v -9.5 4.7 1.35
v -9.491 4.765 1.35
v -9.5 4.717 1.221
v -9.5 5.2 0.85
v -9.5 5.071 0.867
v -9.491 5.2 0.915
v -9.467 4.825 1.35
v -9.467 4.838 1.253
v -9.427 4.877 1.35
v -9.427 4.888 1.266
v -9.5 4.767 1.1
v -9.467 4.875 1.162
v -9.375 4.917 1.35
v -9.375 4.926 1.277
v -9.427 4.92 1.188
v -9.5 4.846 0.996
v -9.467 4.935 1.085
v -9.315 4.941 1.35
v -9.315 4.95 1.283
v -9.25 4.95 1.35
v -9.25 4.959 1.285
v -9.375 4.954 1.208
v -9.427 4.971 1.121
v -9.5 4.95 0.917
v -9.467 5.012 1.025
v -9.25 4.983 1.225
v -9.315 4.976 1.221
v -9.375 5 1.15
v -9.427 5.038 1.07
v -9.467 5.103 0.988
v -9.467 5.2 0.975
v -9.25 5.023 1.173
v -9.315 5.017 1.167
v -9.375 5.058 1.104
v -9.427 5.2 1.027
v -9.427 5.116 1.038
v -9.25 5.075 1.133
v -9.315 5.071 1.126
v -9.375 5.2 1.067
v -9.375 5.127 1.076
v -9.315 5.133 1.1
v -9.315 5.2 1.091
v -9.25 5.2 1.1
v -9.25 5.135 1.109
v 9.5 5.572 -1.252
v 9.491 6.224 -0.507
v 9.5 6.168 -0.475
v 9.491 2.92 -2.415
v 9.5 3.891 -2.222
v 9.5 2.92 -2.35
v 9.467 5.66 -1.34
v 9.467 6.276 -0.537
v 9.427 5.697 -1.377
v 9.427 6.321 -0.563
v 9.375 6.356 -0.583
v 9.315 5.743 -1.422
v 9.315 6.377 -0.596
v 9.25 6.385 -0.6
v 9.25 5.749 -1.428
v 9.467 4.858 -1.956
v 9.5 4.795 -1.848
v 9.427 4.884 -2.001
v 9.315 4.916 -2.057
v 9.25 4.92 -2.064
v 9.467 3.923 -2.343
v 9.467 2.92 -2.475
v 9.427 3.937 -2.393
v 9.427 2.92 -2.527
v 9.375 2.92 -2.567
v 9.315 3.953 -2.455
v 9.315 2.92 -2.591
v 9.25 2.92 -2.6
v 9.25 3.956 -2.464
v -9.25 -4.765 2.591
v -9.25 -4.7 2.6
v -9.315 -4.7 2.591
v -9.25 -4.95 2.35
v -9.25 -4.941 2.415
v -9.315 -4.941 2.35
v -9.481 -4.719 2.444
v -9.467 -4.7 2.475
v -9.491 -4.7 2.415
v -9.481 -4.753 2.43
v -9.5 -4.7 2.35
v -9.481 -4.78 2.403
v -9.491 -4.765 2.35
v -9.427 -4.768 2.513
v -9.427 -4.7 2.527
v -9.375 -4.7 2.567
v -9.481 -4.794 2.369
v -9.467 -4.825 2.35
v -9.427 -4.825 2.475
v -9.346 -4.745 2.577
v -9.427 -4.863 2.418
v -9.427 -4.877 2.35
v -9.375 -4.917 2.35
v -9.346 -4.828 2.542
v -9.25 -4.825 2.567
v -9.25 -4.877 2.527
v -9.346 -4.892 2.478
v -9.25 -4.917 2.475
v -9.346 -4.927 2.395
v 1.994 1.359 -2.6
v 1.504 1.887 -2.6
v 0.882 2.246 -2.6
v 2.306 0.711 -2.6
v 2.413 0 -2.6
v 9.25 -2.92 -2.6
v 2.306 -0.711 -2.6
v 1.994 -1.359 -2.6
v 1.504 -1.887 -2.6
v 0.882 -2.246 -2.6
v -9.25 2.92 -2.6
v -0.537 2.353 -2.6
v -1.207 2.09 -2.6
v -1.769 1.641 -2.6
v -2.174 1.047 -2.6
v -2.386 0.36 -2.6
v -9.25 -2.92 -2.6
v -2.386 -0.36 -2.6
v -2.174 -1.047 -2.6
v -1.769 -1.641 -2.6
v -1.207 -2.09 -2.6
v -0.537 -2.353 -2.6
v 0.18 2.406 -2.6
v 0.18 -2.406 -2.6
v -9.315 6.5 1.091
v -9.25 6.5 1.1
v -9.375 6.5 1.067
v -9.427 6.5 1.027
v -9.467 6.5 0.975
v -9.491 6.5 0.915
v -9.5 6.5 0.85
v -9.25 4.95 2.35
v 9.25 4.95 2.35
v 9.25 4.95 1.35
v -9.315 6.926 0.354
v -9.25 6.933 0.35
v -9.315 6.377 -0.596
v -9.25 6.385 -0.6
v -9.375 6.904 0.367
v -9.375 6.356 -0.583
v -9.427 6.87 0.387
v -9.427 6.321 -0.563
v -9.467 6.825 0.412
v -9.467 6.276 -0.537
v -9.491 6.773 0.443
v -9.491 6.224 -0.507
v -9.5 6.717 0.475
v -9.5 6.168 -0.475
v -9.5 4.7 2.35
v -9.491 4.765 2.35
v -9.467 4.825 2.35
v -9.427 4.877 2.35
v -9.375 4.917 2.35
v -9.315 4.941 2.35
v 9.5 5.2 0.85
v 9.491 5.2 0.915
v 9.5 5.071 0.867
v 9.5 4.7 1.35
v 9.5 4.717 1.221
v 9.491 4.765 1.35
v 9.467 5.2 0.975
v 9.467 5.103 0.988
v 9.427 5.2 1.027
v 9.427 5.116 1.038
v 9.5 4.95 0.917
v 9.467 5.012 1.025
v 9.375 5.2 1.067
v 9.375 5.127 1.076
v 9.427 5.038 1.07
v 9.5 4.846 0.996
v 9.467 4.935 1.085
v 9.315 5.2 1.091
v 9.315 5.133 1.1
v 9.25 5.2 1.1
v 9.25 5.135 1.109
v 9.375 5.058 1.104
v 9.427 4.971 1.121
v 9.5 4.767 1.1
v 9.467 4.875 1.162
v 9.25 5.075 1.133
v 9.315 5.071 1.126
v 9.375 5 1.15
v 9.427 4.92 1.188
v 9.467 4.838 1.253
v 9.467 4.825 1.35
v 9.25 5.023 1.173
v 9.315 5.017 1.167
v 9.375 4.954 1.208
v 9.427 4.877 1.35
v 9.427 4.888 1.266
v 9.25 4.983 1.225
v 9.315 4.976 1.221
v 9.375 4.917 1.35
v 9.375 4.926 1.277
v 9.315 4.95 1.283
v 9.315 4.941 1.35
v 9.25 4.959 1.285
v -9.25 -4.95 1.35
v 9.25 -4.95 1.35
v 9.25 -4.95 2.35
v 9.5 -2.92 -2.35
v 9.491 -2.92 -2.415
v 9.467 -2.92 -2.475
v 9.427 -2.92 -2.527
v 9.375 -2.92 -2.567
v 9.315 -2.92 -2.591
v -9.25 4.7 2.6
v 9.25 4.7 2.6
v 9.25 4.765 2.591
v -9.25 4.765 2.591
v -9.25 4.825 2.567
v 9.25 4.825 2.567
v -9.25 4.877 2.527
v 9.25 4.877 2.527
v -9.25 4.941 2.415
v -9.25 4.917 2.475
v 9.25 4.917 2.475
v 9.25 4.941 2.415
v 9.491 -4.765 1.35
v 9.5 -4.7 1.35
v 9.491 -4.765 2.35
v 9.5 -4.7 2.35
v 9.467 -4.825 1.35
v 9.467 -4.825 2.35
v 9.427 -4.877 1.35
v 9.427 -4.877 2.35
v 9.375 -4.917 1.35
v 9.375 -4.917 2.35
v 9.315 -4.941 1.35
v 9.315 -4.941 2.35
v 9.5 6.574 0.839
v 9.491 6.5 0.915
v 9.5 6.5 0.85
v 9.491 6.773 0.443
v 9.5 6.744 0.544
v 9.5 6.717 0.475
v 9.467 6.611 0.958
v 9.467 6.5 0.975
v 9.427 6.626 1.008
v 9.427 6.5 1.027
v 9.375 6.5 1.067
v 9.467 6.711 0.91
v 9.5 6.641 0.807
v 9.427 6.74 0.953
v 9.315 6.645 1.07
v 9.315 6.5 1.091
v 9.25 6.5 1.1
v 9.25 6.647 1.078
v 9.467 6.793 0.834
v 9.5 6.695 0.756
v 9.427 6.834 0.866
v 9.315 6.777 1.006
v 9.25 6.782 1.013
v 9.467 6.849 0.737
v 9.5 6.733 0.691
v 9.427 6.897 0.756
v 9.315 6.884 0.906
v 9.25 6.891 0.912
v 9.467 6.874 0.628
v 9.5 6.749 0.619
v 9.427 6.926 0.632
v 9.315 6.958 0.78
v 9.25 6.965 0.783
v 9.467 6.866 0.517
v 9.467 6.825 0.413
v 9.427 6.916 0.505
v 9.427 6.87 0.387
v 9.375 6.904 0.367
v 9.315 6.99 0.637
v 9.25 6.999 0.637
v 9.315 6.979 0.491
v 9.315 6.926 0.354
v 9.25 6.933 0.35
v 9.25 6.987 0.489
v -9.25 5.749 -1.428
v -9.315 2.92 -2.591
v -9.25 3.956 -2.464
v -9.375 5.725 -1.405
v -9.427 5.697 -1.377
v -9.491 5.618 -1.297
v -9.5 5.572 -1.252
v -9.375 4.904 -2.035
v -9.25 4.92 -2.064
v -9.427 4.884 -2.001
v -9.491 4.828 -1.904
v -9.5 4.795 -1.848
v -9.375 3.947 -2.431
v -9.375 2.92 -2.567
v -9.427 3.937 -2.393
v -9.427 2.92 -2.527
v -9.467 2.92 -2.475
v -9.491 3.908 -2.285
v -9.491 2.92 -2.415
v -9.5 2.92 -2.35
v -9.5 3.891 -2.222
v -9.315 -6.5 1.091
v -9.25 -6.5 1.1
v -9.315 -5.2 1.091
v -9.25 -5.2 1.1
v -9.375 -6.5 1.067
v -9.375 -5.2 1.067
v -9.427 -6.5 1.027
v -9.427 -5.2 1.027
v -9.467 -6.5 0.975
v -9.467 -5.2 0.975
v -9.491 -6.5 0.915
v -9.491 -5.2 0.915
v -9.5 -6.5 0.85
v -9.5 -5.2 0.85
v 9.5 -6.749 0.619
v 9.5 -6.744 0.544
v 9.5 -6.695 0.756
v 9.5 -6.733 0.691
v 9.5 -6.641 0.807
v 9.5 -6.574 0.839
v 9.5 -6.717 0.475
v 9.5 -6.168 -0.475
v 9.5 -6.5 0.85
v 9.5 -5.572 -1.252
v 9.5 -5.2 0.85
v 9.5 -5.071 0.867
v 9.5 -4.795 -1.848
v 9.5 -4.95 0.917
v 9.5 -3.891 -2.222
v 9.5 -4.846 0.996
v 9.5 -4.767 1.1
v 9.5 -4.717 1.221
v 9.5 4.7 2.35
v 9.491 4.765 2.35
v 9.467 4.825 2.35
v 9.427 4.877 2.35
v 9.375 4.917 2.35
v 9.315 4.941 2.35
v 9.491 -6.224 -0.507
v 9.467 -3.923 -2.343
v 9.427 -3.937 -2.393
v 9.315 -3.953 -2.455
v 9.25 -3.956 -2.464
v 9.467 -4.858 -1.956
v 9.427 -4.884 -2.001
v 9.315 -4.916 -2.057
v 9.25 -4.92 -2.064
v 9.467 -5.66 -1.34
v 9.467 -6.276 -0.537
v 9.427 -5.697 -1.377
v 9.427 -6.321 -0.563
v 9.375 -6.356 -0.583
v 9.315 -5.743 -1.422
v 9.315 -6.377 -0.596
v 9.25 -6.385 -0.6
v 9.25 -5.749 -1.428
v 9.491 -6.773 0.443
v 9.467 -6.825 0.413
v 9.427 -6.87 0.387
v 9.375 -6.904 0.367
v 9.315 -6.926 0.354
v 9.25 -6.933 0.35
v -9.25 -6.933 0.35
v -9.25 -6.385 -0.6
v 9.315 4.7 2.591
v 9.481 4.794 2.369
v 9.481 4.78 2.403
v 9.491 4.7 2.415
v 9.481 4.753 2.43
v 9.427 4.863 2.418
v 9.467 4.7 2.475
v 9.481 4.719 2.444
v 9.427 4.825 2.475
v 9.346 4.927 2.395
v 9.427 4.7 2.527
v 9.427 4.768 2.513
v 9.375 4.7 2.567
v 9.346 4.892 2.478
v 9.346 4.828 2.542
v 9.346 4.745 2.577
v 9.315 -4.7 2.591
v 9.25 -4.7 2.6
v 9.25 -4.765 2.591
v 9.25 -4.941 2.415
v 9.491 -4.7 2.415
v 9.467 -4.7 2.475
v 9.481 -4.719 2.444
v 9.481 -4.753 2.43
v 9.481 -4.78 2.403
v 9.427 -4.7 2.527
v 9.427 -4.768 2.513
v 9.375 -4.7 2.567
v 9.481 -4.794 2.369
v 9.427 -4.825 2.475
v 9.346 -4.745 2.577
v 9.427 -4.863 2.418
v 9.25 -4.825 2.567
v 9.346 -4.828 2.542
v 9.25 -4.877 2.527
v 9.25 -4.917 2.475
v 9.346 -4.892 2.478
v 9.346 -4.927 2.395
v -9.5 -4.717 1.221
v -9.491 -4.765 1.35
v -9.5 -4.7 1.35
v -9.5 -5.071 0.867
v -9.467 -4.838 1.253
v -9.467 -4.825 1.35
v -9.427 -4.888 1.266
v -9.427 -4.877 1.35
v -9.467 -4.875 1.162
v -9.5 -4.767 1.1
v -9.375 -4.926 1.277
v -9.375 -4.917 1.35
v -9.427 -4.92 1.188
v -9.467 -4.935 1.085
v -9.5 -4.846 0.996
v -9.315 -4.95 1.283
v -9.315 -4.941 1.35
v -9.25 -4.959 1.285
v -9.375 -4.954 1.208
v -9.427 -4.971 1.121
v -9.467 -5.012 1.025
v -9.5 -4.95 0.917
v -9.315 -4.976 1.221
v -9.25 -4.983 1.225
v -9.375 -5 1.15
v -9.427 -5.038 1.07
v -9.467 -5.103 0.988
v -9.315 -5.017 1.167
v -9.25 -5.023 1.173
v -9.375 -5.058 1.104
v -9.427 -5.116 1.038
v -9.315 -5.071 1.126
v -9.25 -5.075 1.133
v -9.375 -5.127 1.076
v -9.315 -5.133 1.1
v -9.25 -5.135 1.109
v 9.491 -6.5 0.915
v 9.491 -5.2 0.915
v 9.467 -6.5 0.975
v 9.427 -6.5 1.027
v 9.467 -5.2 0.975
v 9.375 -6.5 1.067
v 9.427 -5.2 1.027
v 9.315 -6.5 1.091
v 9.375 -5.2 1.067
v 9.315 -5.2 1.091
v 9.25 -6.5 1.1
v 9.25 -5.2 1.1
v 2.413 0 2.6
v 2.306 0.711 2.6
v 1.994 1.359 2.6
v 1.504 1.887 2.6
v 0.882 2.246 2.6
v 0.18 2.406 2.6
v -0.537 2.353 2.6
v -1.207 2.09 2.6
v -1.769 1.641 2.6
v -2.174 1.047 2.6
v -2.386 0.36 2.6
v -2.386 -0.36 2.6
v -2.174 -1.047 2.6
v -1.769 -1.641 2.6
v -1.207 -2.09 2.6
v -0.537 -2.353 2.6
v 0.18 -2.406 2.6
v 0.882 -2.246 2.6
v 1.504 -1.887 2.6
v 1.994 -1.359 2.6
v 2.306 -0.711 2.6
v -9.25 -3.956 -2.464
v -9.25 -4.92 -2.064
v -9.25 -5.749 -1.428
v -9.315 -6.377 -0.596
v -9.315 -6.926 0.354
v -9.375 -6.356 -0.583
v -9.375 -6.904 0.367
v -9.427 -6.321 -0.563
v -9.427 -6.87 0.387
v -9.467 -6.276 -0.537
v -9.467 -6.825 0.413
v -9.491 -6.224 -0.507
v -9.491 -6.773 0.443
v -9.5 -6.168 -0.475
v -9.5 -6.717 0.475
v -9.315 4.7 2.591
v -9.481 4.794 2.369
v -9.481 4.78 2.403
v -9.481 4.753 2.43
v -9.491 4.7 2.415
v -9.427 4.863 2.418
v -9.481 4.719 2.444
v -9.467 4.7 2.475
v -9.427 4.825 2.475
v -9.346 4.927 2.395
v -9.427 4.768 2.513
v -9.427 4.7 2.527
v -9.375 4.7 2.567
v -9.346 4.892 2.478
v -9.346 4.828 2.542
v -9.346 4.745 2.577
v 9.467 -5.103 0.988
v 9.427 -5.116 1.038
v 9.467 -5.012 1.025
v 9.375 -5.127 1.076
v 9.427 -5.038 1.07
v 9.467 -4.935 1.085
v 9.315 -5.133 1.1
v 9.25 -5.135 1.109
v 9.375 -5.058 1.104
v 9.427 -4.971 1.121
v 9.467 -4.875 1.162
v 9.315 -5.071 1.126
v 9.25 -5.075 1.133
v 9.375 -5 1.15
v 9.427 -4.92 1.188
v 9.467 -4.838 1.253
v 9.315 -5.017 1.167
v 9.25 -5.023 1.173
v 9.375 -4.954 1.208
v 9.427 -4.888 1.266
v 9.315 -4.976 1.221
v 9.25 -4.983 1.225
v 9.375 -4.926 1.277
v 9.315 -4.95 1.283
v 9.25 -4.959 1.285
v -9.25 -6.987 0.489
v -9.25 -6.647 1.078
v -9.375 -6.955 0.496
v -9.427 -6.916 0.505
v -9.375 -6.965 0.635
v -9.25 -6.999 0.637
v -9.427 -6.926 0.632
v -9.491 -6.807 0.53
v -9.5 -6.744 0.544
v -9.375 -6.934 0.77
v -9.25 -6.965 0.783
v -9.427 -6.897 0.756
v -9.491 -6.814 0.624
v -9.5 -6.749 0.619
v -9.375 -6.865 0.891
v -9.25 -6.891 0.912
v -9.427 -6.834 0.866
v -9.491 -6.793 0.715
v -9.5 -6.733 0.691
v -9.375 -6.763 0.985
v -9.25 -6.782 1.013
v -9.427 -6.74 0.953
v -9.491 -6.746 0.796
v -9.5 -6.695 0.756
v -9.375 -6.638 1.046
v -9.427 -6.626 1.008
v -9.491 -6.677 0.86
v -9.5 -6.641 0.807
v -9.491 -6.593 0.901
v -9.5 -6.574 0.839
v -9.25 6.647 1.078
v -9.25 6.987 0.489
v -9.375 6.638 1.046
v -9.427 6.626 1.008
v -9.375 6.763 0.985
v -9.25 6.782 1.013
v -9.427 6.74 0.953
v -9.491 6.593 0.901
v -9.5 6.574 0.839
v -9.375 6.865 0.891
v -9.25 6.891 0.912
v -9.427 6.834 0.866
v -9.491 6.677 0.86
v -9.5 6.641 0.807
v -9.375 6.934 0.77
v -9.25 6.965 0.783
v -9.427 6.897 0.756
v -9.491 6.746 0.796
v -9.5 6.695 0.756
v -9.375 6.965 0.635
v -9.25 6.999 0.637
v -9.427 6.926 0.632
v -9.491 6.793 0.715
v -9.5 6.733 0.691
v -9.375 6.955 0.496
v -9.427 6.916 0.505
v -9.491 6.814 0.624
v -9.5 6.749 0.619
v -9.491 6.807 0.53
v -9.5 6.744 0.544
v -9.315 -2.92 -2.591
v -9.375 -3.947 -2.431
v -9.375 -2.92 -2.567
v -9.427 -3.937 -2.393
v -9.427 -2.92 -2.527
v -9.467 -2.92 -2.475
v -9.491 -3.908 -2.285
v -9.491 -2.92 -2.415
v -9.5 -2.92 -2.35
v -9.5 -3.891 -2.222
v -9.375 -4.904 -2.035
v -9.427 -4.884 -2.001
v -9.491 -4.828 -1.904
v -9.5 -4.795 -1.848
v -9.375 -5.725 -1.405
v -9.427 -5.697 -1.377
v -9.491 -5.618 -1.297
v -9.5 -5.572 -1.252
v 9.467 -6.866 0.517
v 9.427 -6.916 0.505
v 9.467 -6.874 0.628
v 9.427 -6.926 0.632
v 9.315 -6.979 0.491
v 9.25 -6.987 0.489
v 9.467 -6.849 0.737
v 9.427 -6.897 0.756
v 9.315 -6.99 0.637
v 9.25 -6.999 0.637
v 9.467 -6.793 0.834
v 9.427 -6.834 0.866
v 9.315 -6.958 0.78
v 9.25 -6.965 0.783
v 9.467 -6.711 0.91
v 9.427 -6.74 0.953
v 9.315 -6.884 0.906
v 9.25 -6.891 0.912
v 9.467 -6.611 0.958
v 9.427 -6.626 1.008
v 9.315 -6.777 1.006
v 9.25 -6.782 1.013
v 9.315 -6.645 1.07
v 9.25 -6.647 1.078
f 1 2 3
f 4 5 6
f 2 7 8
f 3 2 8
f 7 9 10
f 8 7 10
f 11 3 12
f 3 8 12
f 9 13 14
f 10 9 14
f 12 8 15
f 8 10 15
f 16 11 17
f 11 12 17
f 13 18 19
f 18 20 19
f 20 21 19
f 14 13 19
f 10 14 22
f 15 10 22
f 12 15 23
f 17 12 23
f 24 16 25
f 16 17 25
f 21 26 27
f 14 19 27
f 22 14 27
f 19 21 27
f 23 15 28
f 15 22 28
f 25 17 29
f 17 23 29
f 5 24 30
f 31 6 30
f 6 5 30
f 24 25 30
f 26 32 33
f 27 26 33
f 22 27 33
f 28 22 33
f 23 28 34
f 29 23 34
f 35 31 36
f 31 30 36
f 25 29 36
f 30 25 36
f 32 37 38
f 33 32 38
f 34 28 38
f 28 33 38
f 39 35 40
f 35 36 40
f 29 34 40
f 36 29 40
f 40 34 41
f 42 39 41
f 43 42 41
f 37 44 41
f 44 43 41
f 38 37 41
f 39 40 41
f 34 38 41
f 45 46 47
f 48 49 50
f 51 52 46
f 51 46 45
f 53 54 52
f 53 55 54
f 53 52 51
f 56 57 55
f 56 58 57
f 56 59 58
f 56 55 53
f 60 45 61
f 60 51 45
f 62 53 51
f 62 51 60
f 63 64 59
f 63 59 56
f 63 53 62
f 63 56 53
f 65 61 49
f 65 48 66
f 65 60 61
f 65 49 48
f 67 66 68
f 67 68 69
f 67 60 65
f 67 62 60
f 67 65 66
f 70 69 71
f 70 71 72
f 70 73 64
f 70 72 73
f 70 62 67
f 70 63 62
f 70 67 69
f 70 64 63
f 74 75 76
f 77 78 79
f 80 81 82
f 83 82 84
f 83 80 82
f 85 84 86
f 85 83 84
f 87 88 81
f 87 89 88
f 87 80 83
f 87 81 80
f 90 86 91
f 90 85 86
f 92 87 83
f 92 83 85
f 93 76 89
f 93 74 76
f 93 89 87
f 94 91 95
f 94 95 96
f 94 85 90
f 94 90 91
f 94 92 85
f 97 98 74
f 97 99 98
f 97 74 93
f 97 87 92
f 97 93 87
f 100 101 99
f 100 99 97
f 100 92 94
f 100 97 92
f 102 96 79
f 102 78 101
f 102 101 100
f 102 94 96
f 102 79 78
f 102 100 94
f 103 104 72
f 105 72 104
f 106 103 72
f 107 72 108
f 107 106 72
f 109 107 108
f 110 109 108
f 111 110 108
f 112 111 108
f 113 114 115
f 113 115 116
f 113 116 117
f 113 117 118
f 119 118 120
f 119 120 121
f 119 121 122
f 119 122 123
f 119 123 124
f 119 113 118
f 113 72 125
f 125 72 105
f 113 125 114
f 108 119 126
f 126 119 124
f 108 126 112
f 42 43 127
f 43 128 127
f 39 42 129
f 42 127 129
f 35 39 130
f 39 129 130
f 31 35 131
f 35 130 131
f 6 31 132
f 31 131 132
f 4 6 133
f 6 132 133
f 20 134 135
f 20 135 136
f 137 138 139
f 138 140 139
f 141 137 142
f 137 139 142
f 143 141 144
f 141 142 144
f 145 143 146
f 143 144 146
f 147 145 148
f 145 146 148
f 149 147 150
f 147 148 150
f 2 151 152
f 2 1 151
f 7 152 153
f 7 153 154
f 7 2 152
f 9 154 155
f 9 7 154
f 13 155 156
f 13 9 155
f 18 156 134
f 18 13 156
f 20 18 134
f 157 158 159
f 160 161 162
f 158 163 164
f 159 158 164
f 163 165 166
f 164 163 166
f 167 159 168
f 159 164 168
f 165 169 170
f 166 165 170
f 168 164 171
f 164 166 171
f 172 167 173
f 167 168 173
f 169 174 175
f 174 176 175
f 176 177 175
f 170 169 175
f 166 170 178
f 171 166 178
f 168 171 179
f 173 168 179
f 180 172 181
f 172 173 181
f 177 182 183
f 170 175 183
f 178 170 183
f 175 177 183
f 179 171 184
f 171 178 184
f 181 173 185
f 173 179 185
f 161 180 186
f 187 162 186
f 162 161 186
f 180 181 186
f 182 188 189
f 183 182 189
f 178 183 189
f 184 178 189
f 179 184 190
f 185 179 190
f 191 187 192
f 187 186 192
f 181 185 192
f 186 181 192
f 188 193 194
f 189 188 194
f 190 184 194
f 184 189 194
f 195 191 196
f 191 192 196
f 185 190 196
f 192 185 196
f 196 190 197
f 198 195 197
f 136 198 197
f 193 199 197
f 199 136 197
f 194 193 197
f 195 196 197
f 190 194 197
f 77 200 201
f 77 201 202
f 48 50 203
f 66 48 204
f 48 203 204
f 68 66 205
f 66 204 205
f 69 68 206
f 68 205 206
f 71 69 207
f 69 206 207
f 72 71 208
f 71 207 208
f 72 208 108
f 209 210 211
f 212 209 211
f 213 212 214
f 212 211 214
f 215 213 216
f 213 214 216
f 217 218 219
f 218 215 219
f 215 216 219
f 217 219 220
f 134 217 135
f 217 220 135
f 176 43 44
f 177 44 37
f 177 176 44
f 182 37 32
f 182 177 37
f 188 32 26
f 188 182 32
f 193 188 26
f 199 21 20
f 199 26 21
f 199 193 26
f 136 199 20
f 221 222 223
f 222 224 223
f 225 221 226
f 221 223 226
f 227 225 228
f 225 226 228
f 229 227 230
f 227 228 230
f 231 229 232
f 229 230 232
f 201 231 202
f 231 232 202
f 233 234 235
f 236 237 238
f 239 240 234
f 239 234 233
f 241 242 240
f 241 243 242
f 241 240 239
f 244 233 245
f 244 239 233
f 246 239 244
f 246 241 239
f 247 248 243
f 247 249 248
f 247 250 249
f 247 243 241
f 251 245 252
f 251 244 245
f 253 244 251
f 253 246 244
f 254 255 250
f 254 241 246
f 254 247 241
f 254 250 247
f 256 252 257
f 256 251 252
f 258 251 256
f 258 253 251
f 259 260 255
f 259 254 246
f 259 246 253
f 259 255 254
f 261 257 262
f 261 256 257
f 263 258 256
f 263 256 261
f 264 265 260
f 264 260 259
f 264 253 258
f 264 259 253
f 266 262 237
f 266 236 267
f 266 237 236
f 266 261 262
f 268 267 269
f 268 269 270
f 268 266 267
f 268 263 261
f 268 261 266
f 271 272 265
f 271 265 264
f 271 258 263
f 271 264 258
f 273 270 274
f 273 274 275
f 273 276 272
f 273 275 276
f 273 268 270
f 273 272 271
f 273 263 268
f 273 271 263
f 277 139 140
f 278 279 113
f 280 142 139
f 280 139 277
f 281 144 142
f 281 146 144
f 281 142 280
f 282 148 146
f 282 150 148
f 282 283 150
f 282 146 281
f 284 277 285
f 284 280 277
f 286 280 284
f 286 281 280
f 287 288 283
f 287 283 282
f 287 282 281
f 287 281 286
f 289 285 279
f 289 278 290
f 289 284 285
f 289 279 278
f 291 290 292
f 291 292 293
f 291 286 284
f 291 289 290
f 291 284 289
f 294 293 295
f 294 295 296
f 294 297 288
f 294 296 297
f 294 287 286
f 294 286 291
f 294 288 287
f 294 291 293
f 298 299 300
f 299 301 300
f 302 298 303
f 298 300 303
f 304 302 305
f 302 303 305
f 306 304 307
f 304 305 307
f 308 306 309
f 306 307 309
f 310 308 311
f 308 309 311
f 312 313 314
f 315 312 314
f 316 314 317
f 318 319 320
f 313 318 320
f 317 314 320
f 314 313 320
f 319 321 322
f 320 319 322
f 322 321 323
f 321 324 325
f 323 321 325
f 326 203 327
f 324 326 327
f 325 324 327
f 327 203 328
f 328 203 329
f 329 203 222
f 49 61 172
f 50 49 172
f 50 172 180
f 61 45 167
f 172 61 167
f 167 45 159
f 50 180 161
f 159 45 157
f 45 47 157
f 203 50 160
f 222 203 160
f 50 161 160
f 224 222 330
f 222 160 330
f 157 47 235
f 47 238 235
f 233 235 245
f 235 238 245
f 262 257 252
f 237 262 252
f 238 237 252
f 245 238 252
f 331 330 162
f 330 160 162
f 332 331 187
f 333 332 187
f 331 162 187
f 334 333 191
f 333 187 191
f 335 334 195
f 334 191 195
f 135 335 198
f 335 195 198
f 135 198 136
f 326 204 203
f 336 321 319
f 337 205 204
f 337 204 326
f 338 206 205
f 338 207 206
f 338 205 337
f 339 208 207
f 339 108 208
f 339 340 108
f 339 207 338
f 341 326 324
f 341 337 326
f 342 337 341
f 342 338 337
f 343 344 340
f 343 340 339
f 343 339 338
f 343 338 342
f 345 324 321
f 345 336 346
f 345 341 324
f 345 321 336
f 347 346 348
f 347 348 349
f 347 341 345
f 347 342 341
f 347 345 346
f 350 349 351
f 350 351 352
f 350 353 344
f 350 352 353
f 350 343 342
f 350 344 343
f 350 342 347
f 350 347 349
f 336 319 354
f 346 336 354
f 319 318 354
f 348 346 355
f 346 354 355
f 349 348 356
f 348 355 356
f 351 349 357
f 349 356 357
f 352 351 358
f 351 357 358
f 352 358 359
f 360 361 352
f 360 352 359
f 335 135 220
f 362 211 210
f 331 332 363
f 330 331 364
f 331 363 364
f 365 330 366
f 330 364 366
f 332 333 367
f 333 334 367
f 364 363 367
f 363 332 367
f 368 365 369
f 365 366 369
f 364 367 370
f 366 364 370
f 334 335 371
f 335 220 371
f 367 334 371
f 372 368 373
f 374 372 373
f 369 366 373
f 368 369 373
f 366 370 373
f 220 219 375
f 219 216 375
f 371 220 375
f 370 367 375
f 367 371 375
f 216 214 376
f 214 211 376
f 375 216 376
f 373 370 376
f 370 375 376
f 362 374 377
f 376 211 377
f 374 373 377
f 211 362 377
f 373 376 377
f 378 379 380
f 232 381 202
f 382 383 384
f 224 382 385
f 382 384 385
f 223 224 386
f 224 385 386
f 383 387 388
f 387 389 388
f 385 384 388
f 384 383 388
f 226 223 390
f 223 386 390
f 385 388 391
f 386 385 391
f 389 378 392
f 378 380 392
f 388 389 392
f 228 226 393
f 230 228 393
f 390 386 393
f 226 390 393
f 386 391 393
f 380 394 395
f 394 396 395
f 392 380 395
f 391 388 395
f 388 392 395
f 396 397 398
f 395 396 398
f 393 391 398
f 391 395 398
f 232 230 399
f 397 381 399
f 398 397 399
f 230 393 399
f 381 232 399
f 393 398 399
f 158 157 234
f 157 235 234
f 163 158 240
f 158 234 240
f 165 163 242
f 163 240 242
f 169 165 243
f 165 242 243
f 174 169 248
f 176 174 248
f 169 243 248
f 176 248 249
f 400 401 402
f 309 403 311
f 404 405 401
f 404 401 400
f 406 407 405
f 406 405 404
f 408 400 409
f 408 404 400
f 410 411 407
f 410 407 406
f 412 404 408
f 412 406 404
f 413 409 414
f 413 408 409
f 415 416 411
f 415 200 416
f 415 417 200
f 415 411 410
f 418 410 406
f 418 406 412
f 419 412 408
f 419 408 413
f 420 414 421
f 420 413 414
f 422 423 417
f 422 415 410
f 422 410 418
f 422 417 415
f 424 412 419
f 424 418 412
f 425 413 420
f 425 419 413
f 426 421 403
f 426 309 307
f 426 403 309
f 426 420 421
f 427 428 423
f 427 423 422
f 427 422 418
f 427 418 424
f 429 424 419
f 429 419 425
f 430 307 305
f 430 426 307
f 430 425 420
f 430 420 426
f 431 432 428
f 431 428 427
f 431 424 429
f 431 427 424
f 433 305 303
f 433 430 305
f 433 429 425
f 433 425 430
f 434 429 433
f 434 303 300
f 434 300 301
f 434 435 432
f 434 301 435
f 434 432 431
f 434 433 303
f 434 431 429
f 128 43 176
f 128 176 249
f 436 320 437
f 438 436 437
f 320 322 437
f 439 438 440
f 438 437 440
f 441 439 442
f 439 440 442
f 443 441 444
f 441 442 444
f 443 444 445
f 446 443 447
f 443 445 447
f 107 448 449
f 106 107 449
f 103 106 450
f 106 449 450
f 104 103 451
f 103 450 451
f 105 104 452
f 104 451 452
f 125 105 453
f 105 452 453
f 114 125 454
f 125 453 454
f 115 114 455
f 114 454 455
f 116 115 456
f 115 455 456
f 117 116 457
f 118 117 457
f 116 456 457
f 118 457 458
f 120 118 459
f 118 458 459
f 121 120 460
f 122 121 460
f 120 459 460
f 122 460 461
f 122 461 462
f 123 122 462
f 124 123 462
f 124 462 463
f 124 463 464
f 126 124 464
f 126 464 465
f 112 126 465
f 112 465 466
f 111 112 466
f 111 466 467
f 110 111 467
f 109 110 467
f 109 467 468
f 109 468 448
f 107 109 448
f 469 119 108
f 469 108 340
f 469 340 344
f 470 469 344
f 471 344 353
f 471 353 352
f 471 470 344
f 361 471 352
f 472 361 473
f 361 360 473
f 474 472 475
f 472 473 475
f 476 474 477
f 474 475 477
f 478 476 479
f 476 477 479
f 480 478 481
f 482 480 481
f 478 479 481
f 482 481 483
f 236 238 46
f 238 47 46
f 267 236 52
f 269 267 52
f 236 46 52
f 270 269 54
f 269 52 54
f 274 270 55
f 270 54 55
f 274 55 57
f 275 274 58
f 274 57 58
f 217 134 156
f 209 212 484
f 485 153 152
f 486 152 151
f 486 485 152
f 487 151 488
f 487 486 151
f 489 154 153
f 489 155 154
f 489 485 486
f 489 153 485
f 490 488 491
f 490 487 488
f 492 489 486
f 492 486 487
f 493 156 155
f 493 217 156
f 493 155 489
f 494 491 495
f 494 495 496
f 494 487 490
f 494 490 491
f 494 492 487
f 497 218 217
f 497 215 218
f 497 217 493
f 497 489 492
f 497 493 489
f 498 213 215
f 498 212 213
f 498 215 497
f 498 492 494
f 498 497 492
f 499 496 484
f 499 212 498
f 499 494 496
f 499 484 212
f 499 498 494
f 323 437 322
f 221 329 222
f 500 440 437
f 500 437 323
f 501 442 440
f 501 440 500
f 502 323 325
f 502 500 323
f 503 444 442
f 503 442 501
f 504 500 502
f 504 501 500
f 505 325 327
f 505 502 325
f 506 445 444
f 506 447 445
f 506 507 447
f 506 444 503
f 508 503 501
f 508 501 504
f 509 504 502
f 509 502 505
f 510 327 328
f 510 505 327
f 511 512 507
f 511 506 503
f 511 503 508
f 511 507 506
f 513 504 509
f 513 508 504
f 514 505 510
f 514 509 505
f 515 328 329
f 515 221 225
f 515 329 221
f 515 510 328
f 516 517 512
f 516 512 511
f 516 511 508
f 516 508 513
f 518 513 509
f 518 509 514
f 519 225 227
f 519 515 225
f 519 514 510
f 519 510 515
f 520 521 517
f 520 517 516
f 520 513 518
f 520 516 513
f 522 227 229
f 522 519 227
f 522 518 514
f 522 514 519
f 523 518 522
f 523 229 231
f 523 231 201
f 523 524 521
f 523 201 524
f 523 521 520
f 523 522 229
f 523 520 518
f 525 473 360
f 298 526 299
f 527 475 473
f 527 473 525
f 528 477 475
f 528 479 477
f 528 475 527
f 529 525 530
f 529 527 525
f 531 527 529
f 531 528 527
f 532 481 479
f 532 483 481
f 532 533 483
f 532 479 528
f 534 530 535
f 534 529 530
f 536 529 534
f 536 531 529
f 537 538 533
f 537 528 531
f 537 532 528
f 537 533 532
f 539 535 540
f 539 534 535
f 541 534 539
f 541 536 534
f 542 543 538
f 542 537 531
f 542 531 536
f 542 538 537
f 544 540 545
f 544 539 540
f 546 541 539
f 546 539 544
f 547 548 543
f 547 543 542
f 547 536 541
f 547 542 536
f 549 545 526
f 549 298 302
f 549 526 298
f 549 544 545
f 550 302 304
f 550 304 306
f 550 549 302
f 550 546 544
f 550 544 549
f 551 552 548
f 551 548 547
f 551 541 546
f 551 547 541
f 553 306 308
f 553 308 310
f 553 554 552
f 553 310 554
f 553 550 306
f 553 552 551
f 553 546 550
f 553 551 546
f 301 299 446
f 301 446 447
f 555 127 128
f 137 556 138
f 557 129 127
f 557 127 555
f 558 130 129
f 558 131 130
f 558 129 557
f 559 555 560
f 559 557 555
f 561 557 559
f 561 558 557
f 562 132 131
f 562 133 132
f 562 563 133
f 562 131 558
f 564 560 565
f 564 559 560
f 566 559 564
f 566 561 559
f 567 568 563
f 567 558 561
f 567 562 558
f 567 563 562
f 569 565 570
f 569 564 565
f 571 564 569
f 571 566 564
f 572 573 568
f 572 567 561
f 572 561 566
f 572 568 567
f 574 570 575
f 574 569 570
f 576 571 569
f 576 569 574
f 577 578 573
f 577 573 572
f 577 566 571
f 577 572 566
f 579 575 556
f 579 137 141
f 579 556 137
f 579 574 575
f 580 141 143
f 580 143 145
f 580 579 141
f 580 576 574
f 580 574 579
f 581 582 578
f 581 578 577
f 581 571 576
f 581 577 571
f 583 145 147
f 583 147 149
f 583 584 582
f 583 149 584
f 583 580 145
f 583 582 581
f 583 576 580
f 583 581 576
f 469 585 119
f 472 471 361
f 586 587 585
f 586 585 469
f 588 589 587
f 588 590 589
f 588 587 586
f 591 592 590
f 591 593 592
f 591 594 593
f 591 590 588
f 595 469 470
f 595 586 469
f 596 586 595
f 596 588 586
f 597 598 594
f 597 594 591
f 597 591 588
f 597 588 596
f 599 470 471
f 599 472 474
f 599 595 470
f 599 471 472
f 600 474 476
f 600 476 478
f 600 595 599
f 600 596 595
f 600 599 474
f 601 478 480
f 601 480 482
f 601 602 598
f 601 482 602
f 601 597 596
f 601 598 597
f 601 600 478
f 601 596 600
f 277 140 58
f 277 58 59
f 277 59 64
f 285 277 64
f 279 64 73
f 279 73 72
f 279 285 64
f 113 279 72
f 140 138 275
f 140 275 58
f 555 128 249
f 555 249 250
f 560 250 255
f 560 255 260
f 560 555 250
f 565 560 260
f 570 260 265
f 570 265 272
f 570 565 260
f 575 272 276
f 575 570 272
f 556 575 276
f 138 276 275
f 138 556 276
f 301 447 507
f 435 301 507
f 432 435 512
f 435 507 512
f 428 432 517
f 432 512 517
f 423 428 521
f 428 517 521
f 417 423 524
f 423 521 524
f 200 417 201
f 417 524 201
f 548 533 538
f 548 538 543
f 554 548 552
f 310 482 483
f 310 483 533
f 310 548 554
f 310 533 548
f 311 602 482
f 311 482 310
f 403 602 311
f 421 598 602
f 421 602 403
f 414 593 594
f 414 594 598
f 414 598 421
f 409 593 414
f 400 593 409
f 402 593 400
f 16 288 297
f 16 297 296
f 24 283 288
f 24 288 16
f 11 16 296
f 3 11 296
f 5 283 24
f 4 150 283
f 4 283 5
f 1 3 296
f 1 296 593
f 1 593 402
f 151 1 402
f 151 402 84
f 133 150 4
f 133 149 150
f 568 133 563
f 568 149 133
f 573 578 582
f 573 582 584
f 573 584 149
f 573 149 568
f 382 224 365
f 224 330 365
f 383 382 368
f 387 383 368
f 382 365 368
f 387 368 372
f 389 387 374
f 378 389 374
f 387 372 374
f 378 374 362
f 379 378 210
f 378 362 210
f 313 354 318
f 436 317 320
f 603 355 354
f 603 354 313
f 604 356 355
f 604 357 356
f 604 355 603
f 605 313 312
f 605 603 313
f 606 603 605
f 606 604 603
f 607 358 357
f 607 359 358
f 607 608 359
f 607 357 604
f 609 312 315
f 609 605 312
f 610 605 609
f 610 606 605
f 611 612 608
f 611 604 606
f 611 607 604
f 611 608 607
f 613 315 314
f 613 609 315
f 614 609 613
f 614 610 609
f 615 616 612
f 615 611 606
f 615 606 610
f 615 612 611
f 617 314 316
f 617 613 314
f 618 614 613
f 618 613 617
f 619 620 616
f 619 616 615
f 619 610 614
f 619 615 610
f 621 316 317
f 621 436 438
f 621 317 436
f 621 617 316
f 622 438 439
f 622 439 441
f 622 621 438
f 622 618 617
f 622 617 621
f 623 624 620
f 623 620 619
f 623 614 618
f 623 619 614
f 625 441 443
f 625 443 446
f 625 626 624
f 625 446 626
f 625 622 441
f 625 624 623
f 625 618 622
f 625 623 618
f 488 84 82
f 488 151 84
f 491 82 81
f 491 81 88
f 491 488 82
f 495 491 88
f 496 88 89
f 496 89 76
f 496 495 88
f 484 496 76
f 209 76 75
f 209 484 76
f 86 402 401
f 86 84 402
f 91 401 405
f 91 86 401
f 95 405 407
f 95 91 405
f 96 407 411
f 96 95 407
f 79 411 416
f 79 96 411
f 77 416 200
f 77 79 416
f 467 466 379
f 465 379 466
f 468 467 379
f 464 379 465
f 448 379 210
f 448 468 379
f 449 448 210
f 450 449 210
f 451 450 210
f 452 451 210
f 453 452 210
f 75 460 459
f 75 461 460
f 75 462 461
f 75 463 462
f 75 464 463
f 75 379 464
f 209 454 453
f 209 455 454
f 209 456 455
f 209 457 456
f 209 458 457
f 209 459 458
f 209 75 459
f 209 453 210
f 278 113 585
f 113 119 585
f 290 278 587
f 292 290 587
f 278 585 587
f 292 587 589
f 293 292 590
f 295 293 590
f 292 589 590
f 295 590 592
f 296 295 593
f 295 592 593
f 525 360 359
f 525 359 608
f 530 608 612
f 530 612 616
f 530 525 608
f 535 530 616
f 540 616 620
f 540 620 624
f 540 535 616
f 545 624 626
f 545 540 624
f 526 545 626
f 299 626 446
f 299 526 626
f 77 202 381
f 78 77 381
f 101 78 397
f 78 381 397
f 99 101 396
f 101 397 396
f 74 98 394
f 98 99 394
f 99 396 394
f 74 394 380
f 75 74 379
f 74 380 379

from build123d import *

# Parameters (mm, degrees)
BOSS_EXTRUDE1_DEPTH      = 9.5
BOSS_EXTRUDE1_DEPTH_BACK = 9.5
SKETCH6_R                = 2.413
CUT_EXTRUDE2_DEPTH       = 13.895347998
FILLET5_R                = 0.25


with BuildPart() as part:
    # Sketch4 → Boss-Extrude1 (new, two sides: drawn at the far end of the back side and taken through both)
    with BuildSketch(Plane(origin=(0, 0, 0), x_dir=(0, 0, -1), z_dir=(1, 0, 0)).offset(-BOSS_EXTRUDE1_DEPTH_BACK)):
        with BuildLine():
            Line((-0.35, 6.933012702), (0.6, 6.384529946))
            ThreePointArc((0.6, 6.384529946), (2.064101615, 4.920428331), (2.6, 2.920428331))
            Line((2.6, 2.920428331), (2.6, -2.920428331))
            ThreePointArc((2.6, -2.920428331), (2.064101615, -4.920428331), (0.6, -6.384529946))
            Line((0.6, -6.384529946), (-0.35, -6.933012702))
            ThreePointArc((-0.35, -6.933012702), (-0.85, -6.933012702), (-1.1, -6.5))
            Line((-1.1, -6.5), (-1.1, -4.95))
            Line((-1.1, -4.95), (-2.6, -4.95))
            Line((-2.6, -4.95), (-2.6, 4.95))
            Line((-2.6, 4.95), (-1.1, 4.95))
            Line((-1.1, 4.95), (-1.1, 6.5))
            ThreePointArc((-1.1, 6.5), (-0.85, 6.933012702), (-0.35, 6.933012702))
        make_face()
    extrude(amount=BOSS_EXTRUDE1_DEPTH + BOSS_EXTRUDE1_DEPTH_BACK)

    # Sketch6 → Cut-Extrude2 (cut, through all)
    with BuildSketch(Plane.XY.offset(2.6)):
        Circle(SKETCH6_R)
    extrude(amount=-CUT_EXTRUDE2_DEPTH, mode=Mode.SUBTRACT)

    # Fillet5
    fillet5_edges = [part.edges().sort_by_distance(p)[0] for p in [
        (-9.5, 4.920428331, -2.064101615),
        (-9.5, 6.658771324, -0.125),
        (-9.5, 6.933012702, 0.85),
        (-9.5, 5.725, 1.1),
        (0, -4.95, 1.1),
        (0, -4.95, 2.6),
        (0, 4.95, 2.6),
        (0, 4.95, 1.1),
        (-9.5, 4.95, 1.85),
        (-9.5, 0, 2.6),
        (-9.5, -4.95, 1.85),
        (-9.5, -5.725, 1.1),
        (9.5, -4.920428331, -2.064101615),
        (9.5, 0, -2.6),
        (9.5, 4.920428331, -2.064101615),
        (-9.5, -6.933012702, 0.85),
        (9.5, 6.658771324, -0.125),
        (9.5, 6.933012702, 0.85),
        (9.5, 5.725, 1.1),
        (9.5, 4.95, 1.85),
        (9.5, 0, 2.6),
        (9.5, -4.95, 1.85),
        (9.5, -5.725, 1.1),
        (9.5, -6.933012702, 0.85),
        (9.5, -6.658771324, -0.125),
        (-9.5, -6.658771324, -0.125),
        (-9.5, -4.920428331, -2.064101615),
        (-9.5, 0, -2.6),
    ]]
    fillet(fillet5_edges, radius=FILLET5_R)


solid = part.part
